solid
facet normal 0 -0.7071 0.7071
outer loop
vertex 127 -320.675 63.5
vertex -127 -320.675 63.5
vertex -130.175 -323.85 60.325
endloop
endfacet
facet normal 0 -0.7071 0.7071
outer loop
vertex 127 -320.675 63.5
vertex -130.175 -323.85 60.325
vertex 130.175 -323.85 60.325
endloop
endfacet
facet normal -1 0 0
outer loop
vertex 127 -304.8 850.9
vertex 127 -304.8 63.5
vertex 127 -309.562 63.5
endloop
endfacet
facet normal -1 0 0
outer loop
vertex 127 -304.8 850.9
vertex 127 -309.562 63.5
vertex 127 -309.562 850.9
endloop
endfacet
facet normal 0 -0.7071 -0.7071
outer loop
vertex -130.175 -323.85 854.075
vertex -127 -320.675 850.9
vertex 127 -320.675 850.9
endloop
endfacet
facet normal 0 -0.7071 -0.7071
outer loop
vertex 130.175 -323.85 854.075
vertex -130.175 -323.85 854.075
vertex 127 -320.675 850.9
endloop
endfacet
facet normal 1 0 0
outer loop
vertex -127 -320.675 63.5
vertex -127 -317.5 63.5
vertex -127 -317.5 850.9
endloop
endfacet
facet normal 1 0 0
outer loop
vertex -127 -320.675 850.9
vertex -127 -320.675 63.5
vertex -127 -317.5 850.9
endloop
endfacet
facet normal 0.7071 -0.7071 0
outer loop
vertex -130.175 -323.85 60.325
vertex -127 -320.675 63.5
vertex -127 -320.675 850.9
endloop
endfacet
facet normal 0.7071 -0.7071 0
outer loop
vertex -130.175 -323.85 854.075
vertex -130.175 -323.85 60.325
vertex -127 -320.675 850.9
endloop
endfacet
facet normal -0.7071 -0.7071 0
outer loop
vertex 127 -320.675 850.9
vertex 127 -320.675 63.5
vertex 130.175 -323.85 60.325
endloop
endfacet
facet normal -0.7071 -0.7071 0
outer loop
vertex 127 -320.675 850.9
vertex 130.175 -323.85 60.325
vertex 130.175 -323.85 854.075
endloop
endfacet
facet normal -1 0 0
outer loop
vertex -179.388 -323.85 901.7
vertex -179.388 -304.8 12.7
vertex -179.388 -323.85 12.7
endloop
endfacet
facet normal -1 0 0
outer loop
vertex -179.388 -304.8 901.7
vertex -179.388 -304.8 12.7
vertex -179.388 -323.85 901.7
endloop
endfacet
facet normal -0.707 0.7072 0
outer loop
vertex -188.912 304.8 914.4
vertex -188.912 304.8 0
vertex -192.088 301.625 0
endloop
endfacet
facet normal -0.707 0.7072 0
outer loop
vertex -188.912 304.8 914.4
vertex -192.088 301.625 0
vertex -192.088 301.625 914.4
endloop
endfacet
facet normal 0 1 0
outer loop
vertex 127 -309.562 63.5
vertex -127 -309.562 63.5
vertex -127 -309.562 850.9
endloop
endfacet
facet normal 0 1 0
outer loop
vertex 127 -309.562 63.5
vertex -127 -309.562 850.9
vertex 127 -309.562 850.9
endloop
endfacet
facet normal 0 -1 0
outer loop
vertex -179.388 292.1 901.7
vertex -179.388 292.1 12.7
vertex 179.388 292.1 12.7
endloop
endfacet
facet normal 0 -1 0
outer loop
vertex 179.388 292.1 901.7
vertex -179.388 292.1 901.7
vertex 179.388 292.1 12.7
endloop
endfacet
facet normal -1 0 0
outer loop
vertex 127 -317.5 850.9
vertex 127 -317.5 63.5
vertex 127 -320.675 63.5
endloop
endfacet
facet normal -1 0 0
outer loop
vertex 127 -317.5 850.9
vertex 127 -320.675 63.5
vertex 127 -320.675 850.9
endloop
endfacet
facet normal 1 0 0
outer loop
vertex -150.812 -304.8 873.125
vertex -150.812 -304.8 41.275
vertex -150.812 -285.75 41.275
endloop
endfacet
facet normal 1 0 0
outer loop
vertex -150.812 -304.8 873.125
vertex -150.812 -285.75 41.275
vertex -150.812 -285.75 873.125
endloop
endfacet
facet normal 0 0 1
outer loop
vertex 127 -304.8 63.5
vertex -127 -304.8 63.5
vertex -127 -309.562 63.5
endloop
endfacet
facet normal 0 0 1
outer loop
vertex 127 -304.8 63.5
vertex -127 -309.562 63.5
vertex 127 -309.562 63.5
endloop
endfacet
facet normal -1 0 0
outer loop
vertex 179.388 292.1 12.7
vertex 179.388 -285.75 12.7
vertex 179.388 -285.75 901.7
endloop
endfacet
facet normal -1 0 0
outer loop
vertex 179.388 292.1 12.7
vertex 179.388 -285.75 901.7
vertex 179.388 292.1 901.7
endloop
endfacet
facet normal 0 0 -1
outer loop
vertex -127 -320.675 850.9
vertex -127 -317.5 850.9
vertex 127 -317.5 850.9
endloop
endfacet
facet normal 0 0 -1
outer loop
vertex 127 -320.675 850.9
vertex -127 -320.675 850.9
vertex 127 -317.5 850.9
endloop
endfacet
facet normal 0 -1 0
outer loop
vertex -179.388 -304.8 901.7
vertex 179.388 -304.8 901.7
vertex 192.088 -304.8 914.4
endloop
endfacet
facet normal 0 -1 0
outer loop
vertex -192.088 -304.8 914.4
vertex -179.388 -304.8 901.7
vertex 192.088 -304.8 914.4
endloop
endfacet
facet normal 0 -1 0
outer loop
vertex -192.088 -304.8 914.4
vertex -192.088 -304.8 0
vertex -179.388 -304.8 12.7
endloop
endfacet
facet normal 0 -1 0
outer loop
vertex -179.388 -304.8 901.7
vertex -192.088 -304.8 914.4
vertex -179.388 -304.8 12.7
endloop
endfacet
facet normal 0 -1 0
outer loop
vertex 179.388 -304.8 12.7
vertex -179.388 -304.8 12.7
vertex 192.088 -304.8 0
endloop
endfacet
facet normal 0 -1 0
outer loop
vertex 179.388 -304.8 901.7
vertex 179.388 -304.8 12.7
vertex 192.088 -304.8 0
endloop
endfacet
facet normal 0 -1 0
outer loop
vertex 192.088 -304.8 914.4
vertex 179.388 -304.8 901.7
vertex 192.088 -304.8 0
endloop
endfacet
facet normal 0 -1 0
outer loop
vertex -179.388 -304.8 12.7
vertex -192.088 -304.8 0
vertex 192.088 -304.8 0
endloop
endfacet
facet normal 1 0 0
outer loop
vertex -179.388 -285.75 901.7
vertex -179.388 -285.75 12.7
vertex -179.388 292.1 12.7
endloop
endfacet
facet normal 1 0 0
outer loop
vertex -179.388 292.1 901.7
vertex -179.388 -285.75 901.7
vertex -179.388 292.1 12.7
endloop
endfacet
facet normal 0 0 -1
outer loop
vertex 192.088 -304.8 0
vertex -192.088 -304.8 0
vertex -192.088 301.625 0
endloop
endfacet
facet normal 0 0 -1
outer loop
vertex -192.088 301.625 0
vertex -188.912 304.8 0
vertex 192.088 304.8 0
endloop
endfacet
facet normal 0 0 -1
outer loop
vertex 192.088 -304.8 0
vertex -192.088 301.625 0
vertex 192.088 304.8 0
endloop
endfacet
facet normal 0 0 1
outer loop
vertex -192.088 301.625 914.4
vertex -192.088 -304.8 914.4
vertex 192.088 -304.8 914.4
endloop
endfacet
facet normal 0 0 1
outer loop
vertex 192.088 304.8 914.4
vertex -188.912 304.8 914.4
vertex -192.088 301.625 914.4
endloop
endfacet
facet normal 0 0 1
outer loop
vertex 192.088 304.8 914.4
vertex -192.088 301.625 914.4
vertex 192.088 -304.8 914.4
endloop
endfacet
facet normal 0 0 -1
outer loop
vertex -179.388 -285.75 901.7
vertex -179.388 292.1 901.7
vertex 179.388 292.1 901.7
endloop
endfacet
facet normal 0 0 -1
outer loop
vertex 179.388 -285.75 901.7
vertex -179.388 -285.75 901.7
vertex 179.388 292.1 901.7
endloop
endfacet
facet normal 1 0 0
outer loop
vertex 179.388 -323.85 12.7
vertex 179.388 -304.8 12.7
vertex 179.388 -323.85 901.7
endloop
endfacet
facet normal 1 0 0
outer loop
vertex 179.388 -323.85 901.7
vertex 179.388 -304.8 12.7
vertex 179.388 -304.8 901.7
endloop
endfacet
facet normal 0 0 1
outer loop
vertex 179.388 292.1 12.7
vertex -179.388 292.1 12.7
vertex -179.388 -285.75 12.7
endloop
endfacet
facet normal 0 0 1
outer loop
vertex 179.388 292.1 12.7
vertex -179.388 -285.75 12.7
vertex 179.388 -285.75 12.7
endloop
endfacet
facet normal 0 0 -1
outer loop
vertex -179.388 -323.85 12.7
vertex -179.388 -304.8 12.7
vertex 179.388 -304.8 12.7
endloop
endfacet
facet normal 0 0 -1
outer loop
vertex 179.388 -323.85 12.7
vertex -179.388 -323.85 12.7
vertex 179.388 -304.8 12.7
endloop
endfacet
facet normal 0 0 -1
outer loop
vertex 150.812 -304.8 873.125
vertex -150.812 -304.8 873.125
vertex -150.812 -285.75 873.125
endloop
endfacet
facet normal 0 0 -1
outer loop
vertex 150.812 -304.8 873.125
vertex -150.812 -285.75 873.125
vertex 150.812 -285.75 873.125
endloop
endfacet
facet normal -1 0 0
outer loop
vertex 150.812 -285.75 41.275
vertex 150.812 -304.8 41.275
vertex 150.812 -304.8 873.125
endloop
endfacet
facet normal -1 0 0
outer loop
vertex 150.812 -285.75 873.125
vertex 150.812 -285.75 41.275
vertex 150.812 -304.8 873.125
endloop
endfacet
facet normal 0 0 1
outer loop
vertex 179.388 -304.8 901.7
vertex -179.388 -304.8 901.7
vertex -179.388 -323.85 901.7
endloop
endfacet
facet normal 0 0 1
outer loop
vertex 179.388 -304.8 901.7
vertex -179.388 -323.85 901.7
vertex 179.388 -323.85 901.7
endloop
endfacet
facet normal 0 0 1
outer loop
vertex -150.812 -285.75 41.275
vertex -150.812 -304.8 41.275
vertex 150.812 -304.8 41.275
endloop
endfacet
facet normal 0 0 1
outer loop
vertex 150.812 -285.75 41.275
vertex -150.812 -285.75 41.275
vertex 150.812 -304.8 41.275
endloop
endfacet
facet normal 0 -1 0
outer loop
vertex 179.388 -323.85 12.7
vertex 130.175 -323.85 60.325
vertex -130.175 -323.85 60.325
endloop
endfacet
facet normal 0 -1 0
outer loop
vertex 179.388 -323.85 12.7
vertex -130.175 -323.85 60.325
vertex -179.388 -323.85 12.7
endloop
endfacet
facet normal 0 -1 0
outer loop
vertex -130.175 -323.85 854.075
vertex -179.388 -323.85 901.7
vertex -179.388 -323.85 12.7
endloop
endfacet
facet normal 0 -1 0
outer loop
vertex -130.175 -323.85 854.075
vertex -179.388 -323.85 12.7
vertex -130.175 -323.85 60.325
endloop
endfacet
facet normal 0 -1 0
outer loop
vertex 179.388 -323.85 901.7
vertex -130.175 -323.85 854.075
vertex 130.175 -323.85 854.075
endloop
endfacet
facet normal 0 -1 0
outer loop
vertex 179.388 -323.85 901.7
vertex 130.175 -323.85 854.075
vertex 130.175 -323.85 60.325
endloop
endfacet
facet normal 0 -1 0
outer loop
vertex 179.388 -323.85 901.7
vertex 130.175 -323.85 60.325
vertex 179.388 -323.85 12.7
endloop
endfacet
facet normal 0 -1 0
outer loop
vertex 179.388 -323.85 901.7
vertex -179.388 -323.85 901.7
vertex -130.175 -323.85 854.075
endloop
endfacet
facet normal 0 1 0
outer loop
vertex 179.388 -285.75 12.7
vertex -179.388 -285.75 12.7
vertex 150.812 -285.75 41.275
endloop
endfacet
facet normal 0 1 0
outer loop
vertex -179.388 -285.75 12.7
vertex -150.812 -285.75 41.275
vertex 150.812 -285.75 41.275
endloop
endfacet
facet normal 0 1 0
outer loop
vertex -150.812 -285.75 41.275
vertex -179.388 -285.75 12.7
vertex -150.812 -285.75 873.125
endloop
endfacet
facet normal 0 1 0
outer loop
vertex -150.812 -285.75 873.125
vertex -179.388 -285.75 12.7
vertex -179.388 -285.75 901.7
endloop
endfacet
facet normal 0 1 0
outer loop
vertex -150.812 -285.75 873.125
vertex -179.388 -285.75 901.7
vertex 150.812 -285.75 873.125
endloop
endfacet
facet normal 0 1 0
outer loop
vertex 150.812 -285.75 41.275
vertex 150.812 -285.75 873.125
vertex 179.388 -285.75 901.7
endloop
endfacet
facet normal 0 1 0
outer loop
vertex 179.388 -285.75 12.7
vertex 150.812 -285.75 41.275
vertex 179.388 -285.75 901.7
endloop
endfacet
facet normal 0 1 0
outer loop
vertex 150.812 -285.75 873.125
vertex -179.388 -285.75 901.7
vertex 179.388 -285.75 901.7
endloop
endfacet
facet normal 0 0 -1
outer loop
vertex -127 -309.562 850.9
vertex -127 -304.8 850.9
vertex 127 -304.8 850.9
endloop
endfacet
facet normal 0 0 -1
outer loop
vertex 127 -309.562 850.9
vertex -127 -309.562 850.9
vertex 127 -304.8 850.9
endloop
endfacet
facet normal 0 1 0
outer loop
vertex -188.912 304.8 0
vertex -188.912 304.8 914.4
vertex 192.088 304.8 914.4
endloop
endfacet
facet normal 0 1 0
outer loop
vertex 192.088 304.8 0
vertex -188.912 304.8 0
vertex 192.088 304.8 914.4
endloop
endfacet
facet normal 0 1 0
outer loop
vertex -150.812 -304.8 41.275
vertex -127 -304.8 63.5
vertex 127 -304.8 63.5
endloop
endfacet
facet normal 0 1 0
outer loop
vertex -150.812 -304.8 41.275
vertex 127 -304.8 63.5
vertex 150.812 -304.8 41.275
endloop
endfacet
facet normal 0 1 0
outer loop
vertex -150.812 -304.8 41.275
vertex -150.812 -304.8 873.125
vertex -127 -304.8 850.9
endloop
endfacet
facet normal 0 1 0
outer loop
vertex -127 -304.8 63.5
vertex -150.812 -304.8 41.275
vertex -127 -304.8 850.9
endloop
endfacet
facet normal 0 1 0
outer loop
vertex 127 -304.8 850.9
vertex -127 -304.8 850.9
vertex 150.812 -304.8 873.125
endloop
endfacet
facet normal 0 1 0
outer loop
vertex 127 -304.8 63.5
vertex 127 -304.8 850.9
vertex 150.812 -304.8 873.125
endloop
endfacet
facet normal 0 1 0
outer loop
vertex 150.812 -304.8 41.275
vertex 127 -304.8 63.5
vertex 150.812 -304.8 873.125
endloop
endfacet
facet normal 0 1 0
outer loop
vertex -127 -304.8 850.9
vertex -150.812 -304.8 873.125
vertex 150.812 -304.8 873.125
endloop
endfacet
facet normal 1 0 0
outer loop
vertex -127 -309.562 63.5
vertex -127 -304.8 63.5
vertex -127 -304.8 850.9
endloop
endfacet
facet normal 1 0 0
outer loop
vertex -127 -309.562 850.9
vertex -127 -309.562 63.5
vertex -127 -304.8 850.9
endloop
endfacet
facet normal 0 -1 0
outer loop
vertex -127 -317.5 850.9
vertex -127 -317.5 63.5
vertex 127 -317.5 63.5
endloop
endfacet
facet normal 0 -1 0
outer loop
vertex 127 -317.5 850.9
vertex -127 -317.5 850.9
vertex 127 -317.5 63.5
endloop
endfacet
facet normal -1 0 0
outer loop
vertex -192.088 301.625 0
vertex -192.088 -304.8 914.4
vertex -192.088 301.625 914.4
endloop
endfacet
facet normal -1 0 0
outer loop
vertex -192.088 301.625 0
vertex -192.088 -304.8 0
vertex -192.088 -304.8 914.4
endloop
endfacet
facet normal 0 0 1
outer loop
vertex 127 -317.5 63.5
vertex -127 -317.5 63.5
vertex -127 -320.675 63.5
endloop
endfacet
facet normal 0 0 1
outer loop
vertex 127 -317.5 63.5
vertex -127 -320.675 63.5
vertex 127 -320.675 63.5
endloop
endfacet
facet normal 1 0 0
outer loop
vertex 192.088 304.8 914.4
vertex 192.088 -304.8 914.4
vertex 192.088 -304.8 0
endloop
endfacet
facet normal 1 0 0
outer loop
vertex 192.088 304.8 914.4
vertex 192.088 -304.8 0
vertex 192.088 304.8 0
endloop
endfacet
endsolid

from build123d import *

# Parameters (mm, degrees)
F0_W     = 384.175
F0_H     = 609.6
F1_DEPTH = 914.4
F2_T     = -12.7
F3_W     = 384.175
F3_H     = 914.4
F3_W_2   = 368.3
F3_H_2   = 901.7
F3_W_3   = 358.775
F3_H_3   = 889
F3_W_4   = 301.625
F3_H_4   = 831.85
F4_DEPTH = 19.05
F3_W_5   = 254
F3_H_5   = 787.4
F5_DEPTH = 19.05
F6_W     = 254
F6_H     = 7.9375
F7_DEPTH = 787.4
F8_SIZE  = 3.175


with BuildPart() as f1:
    # F0 (on Top) → F1 (new body)
    with BuildSketch(Plane.XY):
        Rectangle(F0_W, F0_H)
    extrude(amount=F1_DEPTH)

    # F2
    f2_openings = [f1.faces().sort_by_distance(p)[0] for p in [
        (0, -304.8, 457.2),
    ]]
    offset(amount=F2_T, openings=f2_openings)

    # F3 (on face) → F4 (join)
    with BuildSketch(Plane.XZ.offset(304.8)):
        with Locations((0, 457.2)):
            Rectangle(F3_W, F3_H)
        with Locations((0, 457.2)):
            Rectangle(F3_W_2, F3_H_2, mode=Mode.SUBTRACT)
        with Locations((0, 457.2)):
            Rectangle(F3_W_3, F3_H_3)
        with Locations((0, 457.2)):
            Rectangle(F3_W_4, F3_H_4, mode=Mode.SUBTRACT)
    extrude(amount=-F4_DEPTH)

    # F3 (on face) → F5 (join)
    with BuildSketch(Plane.XZ.offset(304.8)):
        with Locations((0, 457.2)):
            Rectangle(F3_W_3, F3_H_3)
        with Locations((0, 457.2)):
            Rectangle(F3_W_4, F3_H_4, mode=Mode.SUBTRACT)
        with Locations((0, 457.2)):
            Rectangle(F3_W_4, F3_H_4)
        with Locations((0, 457.2)):
            Rectangle(F3_W_5, F3_H_5, mode=Mode.SUBTRACT)
    extrude(amount=F5_DEPTH)

    # F6 (on face) → F7 (join, through all)
    with BuildSketch(Plane(origin=(0, 0, 850.9), x_dir=(1, 0, 0), z_dir=(0, 0, -1))):
        with Locations((0, 313.53125)):
            Rectangle(F6_W, F6_H)
    extrude(amount=F7_DEPTH)

    # F8
    f8_edges = [f1.edges().sort_by_distance(p)[0] for p in [
        (0, -323.85, 63.5),
        (-127, -323.85, 457.2),
        (127, -323.85, 457.2),
        (0, -323.85, 850.9),
        (-192.0875, 304.8, 457.2),
    ]]
    chamfer(f8_edges, length=F8_SIZE)


solid = f1.part
